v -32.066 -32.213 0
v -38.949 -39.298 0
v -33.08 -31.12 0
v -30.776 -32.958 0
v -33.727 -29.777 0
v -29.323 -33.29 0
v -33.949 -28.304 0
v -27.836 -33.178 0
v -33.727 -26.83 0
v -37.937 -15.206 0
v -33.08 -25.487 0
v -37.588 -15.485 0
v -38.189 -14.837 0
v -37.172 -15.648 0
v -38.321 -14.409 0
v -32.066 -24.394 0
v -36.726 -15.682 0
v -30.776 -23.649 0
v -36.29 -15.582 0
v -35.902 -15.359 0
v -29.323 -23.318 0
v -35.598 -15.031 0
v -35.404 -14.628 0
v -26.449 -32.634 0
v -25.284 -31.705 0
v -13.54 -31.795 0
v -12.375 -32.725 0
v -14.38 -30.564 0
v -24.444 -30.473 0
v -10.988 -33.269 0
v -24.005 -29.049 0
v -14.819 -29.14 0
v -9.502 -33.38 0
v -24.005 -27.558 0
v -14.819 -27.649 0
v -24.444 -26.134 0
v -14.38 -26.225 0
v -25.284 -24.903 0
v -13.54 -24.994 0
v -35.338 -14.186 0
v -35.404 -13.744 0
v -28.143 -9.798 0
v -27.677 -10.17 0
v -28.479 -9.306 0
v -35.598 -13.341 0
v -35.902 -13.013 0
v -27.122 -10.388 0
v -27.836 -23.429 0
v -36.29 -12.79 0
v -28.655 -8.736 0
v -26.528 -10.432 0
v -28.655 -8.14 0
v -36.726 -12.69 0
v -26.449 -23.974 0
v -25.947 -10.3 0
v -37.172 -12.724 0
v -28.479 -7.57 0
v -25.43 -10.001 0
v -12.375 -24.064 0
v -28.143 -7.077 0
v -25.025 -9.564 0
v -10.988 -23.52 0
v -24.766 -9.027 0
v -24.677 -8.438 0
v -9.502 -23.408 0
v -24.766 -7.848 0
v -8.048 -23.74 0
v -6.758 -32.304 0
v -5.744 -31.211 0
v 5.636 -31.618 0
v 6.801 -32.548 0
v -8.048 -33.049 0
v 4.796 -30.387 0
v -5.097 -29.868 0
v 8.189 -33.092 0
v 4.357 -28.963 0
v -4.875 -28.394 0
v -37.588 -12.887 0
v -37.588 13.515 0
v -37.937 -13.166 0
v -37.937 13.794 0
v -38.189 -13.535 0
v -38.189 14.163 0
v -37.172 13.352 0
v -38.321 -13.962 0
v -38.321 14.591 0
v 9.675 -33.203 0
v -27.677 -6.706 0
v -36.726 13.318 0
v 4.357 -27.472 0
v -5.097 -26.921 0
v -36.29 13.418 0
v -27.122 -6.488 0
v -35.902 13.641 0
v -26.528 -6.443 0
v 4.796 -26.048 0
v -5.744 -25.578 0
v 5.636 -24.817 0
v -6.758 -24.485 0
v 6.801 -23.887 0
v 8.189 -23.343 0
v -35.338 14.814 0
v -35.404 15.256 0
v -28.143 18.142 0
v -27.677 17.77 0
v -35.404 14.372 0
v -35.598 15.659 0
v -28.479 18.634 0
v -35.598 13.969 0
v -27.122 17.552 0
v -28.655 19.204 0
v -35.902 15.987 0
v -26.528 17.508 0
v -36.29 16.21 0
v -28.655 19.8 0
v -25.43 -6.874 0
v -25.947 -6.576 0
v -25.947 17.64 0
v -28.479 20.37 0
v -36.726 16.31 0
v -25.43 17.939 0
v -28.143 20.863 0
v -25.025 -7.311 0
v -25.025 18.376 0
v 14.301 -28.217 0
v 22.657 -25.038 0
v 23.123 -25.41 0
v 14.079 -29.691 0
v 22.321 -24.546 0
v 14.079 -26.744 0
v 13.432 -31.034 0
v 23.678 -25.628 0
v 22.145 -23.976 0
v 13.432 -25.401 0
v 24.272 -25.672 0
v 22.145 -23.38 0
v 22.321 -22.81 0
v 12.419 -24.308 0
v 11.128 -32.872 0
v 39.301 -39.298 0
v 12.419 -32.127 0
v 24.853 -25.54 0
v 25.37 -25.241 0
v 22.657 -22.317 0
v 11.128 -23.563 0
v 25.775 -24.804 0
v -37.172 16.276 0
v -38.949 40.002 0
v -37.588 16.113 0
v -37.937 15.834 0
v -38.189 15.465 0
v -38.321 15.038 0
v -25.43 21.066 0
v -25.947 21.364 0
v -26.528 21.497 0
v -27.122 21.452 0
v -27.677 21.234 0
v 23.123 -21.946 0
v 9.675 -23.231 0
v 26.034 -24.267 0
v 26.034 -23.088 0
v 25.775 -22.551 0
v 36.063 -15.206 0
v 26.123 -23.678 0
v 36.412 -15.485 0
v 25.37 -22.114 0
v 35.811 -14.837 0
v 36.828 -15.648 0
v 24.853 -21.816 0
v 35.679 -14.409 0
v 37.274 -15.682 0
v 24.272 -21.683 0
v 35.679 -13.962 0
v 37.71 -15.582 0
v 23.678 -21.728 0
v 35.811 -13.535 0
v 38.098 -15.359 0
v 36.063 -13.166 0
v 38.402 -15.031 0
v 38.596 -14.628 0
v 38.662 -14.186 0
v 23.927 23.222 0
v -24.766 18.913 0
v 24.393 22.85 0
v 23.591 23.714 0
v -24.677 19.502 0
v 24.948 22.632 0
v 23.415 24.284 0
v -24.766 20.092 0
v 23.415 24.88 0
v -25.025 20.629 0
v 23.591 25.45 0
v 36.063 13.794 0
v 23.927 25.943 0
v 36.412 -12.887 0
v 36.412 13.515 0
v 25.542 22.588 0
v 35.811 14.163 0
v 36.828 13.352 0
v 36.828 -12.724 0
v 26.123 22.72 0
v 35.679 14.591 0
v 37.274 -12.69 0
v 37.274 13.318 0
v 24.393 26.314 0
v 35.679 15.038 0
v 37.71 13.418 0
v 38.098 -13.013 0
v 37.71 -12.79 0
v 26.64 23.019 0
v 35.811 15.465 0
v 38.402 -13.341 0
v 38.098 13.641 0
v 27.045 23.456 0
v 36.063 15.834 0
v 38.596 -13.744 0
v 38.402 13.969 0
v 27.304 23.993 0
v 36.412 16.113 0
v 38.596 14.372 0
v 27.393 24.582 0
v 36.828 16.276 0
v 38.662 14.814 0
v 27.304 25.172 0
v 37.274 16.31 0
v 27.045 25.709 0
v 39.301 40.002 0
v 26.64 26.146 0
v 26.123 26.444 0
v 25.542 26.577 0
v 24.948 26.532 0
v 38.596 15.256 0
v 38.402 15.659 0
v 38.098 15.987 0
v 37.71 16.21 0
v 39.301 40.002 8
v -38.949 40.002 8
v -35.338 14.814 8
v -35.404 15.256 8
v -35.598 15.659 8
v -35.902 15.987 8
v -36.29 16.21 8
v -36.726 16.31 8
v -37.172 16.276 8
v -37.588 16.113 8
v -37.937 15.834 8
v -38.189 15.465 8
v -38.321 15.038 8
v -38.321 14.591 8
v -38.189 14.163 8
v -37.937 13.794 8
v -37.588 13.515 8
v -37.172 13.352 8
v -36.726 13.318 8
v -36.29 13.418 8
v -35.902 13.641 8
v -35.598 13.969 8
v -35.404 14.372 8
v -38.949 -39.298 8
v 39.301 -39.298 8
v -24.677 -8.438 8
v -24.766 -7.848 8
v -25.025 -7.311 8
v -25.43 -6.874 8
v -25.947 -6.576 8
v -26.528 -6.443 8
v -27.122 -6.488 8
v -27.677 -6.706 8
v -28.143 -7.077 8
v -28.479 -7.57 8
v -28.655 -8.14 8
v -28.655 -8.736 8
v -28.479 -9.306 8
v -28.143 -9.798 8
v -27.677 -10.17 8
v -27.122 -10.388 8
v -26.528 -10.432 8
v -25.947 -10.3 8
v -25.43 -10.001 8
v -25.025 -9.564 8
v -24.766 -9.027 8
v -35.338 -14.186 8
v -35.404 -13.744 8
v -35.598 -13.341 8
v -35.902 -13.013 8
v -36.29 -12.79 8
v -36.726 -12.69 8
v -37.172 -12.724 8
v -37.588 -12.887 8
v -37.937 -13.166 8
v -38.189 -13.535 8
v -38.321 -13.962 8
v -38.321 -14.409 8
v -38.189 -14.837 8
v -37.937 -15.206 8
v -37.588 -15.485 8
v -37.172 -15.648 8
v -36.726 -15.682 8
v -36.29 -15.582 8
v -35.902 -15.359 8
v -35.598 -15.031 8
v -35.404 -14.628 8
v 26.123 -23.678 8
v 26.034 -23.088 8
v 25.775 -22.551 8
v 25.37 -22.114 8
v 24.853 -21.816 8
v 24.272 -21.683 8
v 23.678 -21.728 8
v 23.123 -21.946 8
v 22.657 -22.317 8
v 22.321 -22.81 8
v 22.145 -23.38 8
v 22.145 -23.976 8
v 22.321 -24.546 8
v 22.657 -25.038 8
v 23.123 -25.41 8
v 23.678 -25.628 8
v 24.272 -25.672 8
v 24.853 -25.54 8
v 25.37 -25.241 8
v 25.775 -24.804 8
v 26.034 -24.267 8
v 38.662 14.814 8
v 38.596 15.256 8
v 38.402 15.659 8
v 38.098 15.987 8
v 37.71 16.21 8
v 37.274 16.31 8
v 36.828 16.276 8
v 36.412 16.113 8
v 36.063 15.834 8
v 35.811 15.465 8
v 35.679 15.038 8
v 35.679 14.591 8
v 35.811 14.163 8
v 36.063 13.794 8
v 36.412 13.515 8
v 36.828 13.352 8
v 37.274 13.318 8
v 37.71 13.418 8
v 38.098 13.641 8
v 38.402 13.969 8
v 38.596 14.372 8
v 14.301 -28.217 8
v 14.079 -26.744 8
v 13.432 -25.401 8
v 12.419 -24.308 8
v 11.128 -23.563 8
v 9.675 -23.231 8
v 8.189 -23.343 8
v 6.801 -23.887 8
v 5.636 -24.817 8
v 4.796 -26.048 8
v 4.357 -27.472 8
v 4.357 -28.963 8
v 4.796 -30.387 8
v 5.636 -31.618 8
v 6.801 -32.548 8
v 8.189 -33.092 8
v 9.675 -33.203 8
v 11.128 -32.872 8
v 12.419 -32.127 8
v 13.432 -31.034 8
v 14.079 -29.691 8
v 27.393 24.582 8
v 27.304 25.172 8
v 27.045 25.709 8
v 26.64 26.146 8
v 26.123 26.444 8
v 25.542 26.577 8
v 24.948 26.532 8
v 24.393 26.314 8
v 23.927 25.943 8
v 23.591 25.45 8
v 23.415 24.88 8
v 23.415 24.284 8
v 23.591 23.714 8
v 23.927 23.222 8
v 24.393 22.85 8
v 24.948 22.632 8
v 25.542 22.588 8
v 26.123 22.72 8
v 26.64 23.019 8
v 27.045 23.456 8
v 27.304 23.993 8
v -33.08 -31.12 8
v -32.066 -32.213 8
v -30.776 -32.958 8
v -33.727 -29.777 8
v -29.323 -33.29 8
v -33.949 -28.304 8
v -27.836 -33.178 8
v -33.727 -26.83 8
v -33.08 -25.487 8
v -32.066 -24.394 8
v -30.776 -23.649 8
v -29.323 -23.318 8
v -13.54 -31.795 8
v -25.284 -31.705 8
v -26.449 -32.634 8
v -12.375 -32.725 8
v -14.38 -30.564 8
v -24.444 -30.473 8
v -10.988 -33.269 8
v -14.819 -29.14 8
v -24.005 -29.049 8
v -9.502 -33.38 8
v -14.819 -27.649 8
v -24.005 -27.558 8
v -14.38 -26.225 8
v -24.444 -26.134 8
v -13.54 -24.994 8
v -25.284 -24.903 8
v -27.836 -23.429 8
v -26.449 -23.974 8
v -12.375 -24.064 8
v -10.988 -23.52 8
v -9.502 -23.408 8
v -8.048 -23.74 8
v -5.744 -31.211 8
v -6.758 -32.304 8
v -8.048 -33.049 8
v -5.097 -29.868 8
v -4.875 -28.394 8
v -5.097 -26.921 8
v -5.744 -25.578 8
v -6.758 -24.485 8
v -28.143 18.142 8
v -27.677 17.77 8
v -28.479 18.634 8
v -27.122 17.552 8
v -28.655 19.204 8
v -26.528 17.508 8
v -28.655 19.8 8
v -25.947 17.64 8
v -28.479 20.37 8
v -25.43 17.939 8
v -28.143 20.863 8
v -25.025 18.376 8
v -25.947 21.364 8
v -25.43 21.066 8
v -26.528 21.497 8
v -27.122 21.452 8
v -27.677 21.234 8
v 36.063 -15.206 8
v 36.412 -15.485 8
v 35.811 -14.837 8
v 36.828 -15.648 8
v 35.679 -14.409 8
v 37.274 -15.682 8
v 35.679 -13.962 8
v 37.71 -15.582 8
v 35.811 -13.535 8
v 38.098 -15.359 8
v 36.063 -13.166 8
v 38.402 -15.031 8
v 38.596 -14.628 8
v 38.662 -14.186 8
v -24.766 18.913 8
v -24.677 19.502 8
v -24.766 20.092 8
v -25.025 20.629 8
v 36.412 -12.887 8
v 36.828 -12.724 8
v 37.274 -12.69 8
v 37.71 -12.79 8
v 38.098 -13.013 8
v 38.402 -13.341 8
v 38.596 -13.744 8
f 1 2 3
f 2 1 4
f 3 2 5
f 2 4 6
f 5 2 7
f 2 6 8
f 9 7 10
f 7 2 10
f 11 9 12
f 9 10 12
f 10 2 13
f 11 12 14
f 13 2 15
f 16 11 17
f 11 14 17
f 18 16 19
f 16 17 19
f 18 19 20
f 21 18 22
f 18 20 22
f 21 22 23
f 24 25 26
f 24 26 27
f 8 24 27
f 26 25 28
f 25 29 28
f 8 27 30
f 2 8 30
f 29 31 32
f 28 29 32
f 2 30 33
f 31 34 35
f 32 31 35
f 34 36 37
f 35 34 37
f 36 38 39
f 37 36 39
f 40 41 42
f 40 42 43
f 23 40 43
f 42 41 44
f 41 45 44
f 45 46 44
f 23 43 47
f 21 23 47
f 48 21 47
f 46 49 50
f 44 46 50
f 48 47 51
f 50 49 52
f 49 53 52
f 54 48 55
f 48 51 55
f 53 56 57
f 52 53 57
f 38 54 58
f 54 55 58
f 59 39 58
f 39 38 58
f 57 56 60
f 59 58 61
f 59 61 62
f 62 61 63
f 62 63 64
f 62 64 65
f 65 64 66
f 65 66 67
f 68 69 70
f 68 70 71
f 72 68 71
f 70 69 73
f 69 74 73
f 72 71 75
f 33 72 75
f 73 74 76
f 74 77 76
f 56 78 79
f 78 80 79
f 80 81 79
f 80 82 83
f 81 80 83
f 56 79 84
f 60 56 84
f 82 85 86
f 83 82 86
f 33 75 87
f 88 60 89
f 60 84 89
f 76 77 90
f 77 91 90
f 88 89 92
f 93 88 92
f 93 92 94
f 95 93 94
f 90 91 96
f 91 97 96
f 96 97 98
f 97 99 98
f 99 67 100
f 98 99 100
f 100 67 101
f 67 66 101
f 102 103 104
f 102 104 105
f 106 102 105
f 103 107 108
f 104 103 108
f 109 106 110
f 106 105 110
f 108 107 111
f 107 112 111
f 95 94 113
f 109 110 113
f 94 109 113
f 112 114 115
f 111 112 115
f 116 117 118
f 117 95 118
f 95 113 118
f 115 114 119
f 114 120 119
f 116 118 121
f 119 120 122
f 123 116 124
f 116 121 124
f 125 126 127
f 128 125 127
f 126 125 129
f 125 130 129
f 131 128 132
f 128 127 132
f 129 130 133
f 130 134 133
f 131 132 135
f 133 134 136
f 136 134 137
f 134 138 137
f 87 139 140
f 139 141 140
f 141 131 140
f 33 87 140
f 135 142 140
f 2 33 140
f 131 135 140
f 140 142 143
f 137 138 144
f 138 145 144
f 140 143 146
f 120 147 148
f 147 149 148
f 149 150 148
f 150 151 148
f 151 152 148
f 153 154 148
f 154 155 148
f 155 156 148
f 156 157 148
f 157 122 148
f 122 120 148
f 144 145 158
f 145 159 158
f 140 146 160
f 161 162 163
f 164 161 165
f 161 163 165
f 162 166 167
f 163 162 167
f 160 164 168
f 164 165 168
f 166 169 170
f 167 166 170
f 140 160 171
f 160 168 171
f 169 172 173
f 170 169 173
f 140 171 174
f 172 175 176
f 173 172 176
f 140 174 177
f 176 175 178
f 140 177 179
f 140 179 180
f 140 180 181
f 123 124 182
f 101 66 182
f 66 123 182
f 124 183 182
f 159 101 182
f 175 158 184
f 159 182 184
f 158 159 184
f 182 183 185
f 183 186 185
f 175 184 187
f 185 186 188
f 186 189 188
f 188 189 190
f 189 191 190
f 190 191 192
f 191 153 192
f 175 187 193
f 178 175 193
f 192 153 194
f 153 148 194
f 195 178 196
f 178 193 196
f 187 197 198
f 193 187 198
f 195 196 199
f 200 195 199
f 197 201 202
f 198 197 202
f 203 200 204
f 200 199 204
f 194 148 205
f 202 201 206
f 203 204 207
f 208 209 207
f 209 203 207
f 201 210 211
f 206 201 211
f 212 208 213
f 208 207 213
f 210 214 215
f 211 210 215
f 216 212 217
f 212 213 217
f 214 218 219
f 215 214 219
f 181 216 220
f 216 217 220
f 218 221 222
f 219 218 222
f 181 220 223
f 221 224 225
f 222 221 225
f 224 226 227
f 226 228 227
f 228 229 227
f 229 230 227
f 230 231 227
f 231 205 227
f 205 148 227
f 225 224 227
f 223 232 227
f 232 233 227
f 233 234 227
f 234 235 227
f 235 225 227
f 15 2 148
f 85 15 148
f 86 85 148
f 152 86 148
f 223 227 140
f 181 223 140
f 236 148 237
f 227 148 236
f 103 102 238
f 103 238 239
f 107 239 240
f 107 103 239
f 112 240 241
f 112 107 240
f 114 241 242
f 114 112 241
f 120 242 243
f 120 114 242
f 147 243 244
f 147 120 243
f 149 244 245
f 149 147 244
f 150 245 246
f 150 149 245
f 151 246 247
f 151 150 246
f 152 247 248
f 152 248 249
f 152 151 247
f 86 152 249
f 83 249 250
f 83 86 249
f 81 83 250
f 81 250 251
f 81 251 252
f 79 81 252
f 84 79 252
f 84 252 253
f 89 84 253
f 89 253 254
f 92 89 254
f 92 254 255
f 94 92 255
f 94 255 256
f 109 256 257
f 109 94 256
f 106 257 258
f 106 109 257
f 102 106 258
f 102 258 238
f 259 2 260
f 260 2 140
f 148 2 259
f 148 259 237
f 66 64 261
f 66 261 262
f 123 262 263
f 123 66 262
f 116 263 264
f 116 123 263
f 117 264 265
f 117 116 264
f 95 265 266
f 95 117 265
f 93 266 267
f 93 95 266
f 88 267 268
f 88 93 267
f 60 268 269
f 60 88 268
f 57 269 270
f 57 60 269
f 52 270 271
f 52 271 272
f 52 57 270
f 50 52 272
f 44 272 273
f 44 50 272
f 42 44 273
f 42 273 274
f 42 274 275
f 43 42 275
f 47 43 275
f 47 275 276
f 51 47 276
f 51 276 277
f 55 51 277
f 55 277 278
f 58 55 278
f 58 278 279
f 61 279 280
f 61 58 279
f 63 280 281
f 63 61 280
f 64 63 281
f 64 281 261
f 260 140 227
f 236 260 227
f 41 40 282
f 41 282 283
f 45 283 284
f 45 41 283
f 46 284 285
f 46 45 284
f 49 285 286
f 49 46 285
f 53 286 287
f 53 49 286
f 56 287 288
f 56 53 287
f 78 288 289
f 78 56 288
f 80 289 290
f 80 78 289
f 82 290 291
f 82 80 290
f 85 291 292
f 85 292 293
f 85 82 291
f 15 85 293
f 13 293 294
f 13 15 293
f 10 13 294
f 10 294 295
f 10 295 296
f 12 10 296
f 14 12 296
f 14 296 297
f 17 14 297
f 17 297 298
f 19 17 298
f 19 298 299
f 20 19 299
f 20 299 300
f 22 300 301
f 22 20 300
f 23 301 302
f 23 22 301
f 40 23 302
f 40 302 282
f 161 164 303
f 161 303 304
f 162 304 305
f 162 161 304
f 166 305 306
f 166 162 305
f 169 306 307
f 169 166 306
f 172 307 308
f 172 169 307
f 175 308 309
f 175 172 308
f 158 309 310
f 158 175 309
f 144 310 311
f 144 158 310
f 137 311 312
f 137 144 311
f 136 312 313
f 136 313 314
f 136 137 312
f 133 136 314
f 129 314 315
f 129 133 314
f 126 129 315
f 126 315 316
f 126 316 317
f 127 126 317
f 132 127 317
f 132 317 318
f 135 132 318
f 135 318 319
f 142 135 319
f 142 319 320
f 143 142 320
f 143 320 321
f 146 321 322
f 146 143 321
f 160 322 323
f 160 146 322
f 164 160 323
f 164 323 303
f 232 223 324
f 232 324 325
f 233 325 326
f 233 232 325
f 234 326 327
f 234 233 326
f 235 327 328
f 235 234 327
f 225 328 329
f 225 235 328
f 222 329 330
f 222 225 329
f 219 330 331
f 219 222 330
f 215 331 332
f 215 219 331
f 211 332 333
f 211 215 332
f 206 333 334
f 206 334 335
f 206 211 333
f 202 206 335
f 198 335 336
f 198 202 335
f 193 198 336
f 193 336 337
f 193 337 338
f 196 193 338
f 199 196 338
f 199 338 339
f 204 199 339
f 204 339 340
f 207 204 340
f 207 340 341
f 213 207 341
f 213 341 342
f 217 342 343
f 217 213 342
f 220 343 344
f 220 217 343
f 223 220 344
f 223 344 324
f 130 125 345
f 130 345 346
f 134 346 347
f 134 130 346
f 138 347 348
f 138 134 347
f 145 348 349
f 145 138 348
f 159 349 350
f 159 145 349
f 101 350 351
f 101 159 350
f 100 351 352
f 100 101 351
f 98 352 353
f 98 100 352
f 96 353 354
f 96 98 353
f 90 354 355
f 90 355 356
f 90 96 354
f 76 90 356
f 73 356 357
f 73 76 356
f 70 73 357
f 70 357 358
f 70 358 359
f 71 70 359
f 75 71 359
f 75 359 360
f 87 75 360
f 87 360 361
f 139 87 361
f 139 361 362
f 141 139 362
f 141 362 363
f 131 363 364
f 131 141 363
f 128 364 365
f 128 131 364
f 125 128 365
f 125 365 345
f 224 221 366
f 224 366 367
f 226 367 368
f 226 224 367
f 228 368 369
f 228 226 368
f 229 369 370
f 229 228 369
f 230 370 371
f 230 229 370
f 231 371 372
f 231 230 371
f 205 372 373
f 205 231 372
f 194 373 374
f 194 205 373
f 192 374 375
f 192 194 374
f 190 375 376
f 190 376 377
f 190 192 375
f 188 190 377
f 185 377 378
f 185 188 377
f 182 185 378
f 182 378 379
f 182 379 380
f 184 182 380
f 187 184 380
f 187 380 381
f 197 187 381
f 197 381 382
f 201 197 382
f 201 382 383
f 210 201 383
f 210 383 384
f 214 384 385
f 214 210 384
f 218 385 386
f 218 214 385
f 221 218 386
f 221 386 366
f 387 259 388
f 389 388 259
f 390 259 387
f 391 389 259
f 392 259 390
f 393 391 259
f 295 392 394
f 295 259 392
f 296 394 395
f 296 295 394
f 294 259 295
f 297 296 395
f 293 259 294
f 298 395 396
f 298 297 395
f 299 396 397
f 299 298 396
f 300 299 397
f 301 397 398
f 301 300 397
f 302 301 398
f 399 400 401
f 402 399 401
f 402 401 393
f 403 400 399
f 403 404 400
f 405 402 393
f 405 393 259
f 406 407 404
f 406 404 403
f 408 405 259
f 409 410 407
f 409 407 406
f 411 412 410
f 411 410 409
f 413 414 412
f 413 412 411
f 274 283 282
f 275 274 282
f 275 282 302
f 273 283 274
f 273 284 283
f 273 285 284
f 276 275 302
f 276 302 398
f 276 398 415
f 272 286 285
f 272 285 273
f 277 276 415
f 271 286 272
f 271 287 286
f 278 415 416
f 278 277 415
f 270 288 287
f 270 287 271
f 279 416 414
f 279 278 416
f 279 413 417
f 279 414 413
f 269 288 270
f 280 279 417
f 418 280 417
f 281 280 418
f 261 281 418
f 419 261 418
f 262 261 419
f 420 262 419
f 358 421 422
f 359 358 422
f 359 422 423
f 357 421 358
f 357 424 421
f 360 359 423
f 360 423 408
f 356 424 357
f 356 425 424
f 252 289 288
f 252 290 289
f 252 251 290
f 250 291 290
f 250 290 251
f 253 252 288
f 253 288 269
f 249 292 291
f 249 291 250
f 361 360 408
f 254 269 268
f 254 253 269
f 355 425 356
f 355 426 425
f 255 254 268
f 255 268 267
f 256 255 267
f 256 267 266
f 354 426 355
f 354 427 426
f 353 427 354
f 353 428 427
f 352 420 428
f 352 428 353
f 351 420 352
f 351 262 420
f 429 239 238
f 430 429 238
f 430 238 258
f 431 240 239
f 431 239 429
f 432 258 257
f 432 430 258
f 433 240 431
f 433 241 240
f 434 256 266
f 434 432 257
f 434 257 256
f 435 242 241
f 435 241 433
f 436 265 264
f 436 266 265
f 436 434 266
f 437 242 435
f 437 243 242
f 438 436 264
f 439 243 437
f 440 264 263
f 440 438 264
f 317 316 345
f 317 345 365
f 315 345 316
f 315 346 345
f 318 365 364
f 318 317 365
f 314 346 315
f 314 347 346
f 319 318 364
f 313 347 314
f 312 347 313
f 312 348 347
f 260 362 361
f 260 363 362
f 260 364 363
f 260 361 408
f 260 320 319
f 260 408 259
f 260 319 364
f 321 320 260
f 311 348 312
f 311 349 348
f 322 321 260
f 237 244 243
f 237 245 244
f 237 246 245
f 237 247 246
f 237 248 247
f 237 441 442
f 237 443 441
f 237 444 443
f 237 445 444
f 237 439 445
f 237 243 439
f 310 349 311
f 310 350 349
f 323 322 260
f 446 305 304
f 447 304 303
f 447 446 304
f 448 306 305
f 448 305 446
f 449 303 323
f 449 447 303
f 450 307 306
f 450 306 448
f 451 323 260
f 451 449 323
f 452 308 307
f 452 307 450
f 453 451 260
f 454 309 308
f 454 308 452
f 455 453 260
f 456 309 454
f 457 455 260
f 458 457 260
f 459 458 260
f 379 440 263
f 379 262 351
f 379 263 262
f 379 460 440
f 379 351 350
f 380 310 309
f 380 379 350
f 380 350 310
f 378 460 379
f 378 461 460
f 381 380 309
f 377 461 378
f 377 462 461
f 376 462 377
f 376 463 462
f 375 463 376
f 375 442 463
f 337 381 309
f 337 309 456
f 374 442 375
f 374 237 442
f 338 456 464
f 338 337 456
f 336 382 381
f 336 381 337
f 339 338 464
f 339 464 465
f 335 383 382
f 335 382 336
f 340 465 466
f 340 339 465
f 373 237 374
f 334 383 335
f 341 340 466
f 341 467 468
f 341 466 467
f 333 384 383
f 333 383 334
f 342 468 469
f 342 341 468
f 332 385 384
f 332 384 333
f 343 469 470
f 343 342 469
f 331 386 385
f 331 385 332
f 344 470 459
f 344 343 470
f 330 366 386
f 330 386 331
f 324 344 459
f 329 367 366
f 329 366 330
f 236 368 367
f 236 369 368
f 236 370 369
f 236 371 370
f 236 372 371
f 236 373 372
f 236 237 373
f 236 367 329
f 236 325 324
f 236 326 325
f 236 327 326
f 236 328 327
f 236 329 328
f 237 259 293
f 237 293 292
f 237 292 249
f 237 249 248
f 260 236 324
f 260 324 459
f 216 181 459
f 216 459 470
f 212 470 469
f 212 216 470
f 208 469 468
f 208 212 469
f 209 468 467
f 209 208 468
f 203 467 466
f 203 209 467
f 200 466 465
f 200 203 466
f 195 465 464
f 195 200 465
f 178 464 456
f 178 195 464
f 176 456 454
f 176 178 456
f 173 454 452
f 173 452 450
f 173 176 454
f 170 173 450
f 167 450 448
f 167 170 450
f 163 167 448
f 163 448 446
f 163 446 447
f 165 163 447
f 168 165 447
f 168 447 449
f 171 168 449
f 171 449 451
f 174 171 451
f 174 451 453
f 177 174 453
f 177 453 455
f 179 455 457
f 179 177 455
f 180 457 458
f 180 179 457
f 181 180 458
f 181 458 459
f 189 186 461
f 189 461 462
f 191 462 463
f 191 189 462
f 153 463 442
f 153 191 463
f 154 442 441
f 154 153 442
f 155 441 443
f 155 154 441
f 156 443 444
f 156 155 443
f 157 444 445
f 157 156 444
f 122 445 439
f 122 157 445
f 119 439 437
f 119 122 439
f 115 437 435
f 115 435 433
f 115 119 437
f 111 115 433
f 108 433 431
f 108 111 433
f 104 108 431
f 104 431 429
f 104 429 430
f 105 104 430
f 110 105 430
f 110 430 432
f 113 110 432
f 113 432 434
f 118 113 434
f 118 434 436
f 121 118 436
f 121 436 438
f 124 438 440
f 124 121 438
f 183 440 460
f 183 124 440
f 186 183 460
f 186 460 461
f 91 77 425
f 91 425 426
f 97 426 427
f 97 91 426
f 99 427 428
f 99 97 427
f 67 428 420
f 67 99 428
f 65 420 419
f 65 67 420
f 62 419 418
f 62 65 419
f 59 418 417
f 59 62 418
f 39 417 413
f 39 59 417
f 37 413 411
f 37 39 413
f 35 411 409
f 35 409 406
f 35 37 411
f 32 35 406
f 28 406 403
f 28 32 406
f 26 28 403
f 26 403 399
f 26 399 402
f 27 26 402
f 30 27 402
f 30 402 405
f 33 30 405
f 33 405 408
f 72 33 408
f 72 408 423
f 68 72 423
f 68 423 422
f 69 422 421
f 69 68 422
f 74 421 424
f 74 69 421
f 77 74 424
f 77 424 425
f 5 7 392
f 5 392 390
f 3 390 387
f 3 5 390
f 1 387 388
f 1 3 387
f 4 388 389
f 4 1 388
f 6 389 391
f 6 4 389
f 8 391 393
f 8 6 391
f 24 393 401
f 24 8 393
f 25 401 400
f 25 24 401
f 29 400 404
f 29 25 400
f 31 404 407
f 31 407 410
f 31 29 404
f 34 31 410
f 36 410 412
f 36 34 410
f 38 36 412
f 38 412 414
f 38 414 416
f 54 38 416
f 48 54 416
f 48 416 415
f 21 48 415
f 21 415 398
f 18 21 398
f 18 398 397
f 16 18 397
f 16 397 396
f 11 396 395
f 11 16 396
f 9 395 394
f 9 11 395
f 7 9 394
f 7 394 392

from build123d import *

# Parameters (mm, degrees)
SKETCH1_W           = 78.25
SKETCH1_H           = 79.3
SKETCH1_R           = 5
SKETCH1_R_2         = 2
SKETCH1_R_3         = 1.5
BOSS_EXTRUDE1_DEPTH = 8


with BuildPart() as part:
    # Sketch1 → Boss-Extrude1 (new body)
    with BuildSketch(Plane.XY):
        with Locations((0.176122561, 0.352245122)):
            Rectangle(SKETCH1_W, SKETCH1_H)
        with Locations((-9.875194839, -28.39441243)):
            Circle(SKETCH1_R, mode=Mode.SUBTRACT)
        with Locations((9.301122561, -28.217424669)):
            Circle(SKETCH1_R, mode=Mode.SUBTRACT)
        with Locations(Location((-28.948877439, -28.303646558, 0), (0, 0, 180))):
            Circle(SKETCH1_R, mode=Mode.SUBTRACT)
        with Locations((-26.677304512, 19.502245122)):
            Circle(SKETCH1_R_2, mode=Mode.SUBTRACT)
        with Locations((-26.677304512, -8.437754878)):
            Circle(SKETCH1_R_2, mode=Mode.SUBTRACT)
        with Locations((24.122695488, -23.677754878)):
            Circle(SKETCH1_R_2, mode=Mode.SUBTRACT)
        with Locations((25.392695488, 24.582245122)):
            Circle(SKETCH1_R_2, mode=Mode.SUBTRACT)
        with Locations((-36.837723202, 14.814078865)):
            Circle(SKETCH1_R_3, mode=Mode.SUBTRACT)
        with Locations((-36.837723202, -14.185921135)):
            Circle(SKETCH1_R_3, mode=Mode.SUBTRACT)
        with Locations((37.162276798, -14.185921135)):
            Circle(SKETCH1_R_3, mode=Mode.SUBTRACT)
        with Locations((37.162276798, 14.814078865)):
            Circle(SKETCH1_R_3, mode=Mode.SUBTRACT)
    extrude(amount=BOSS_EXTRUDE1_DEPTH)


solid = part.part
